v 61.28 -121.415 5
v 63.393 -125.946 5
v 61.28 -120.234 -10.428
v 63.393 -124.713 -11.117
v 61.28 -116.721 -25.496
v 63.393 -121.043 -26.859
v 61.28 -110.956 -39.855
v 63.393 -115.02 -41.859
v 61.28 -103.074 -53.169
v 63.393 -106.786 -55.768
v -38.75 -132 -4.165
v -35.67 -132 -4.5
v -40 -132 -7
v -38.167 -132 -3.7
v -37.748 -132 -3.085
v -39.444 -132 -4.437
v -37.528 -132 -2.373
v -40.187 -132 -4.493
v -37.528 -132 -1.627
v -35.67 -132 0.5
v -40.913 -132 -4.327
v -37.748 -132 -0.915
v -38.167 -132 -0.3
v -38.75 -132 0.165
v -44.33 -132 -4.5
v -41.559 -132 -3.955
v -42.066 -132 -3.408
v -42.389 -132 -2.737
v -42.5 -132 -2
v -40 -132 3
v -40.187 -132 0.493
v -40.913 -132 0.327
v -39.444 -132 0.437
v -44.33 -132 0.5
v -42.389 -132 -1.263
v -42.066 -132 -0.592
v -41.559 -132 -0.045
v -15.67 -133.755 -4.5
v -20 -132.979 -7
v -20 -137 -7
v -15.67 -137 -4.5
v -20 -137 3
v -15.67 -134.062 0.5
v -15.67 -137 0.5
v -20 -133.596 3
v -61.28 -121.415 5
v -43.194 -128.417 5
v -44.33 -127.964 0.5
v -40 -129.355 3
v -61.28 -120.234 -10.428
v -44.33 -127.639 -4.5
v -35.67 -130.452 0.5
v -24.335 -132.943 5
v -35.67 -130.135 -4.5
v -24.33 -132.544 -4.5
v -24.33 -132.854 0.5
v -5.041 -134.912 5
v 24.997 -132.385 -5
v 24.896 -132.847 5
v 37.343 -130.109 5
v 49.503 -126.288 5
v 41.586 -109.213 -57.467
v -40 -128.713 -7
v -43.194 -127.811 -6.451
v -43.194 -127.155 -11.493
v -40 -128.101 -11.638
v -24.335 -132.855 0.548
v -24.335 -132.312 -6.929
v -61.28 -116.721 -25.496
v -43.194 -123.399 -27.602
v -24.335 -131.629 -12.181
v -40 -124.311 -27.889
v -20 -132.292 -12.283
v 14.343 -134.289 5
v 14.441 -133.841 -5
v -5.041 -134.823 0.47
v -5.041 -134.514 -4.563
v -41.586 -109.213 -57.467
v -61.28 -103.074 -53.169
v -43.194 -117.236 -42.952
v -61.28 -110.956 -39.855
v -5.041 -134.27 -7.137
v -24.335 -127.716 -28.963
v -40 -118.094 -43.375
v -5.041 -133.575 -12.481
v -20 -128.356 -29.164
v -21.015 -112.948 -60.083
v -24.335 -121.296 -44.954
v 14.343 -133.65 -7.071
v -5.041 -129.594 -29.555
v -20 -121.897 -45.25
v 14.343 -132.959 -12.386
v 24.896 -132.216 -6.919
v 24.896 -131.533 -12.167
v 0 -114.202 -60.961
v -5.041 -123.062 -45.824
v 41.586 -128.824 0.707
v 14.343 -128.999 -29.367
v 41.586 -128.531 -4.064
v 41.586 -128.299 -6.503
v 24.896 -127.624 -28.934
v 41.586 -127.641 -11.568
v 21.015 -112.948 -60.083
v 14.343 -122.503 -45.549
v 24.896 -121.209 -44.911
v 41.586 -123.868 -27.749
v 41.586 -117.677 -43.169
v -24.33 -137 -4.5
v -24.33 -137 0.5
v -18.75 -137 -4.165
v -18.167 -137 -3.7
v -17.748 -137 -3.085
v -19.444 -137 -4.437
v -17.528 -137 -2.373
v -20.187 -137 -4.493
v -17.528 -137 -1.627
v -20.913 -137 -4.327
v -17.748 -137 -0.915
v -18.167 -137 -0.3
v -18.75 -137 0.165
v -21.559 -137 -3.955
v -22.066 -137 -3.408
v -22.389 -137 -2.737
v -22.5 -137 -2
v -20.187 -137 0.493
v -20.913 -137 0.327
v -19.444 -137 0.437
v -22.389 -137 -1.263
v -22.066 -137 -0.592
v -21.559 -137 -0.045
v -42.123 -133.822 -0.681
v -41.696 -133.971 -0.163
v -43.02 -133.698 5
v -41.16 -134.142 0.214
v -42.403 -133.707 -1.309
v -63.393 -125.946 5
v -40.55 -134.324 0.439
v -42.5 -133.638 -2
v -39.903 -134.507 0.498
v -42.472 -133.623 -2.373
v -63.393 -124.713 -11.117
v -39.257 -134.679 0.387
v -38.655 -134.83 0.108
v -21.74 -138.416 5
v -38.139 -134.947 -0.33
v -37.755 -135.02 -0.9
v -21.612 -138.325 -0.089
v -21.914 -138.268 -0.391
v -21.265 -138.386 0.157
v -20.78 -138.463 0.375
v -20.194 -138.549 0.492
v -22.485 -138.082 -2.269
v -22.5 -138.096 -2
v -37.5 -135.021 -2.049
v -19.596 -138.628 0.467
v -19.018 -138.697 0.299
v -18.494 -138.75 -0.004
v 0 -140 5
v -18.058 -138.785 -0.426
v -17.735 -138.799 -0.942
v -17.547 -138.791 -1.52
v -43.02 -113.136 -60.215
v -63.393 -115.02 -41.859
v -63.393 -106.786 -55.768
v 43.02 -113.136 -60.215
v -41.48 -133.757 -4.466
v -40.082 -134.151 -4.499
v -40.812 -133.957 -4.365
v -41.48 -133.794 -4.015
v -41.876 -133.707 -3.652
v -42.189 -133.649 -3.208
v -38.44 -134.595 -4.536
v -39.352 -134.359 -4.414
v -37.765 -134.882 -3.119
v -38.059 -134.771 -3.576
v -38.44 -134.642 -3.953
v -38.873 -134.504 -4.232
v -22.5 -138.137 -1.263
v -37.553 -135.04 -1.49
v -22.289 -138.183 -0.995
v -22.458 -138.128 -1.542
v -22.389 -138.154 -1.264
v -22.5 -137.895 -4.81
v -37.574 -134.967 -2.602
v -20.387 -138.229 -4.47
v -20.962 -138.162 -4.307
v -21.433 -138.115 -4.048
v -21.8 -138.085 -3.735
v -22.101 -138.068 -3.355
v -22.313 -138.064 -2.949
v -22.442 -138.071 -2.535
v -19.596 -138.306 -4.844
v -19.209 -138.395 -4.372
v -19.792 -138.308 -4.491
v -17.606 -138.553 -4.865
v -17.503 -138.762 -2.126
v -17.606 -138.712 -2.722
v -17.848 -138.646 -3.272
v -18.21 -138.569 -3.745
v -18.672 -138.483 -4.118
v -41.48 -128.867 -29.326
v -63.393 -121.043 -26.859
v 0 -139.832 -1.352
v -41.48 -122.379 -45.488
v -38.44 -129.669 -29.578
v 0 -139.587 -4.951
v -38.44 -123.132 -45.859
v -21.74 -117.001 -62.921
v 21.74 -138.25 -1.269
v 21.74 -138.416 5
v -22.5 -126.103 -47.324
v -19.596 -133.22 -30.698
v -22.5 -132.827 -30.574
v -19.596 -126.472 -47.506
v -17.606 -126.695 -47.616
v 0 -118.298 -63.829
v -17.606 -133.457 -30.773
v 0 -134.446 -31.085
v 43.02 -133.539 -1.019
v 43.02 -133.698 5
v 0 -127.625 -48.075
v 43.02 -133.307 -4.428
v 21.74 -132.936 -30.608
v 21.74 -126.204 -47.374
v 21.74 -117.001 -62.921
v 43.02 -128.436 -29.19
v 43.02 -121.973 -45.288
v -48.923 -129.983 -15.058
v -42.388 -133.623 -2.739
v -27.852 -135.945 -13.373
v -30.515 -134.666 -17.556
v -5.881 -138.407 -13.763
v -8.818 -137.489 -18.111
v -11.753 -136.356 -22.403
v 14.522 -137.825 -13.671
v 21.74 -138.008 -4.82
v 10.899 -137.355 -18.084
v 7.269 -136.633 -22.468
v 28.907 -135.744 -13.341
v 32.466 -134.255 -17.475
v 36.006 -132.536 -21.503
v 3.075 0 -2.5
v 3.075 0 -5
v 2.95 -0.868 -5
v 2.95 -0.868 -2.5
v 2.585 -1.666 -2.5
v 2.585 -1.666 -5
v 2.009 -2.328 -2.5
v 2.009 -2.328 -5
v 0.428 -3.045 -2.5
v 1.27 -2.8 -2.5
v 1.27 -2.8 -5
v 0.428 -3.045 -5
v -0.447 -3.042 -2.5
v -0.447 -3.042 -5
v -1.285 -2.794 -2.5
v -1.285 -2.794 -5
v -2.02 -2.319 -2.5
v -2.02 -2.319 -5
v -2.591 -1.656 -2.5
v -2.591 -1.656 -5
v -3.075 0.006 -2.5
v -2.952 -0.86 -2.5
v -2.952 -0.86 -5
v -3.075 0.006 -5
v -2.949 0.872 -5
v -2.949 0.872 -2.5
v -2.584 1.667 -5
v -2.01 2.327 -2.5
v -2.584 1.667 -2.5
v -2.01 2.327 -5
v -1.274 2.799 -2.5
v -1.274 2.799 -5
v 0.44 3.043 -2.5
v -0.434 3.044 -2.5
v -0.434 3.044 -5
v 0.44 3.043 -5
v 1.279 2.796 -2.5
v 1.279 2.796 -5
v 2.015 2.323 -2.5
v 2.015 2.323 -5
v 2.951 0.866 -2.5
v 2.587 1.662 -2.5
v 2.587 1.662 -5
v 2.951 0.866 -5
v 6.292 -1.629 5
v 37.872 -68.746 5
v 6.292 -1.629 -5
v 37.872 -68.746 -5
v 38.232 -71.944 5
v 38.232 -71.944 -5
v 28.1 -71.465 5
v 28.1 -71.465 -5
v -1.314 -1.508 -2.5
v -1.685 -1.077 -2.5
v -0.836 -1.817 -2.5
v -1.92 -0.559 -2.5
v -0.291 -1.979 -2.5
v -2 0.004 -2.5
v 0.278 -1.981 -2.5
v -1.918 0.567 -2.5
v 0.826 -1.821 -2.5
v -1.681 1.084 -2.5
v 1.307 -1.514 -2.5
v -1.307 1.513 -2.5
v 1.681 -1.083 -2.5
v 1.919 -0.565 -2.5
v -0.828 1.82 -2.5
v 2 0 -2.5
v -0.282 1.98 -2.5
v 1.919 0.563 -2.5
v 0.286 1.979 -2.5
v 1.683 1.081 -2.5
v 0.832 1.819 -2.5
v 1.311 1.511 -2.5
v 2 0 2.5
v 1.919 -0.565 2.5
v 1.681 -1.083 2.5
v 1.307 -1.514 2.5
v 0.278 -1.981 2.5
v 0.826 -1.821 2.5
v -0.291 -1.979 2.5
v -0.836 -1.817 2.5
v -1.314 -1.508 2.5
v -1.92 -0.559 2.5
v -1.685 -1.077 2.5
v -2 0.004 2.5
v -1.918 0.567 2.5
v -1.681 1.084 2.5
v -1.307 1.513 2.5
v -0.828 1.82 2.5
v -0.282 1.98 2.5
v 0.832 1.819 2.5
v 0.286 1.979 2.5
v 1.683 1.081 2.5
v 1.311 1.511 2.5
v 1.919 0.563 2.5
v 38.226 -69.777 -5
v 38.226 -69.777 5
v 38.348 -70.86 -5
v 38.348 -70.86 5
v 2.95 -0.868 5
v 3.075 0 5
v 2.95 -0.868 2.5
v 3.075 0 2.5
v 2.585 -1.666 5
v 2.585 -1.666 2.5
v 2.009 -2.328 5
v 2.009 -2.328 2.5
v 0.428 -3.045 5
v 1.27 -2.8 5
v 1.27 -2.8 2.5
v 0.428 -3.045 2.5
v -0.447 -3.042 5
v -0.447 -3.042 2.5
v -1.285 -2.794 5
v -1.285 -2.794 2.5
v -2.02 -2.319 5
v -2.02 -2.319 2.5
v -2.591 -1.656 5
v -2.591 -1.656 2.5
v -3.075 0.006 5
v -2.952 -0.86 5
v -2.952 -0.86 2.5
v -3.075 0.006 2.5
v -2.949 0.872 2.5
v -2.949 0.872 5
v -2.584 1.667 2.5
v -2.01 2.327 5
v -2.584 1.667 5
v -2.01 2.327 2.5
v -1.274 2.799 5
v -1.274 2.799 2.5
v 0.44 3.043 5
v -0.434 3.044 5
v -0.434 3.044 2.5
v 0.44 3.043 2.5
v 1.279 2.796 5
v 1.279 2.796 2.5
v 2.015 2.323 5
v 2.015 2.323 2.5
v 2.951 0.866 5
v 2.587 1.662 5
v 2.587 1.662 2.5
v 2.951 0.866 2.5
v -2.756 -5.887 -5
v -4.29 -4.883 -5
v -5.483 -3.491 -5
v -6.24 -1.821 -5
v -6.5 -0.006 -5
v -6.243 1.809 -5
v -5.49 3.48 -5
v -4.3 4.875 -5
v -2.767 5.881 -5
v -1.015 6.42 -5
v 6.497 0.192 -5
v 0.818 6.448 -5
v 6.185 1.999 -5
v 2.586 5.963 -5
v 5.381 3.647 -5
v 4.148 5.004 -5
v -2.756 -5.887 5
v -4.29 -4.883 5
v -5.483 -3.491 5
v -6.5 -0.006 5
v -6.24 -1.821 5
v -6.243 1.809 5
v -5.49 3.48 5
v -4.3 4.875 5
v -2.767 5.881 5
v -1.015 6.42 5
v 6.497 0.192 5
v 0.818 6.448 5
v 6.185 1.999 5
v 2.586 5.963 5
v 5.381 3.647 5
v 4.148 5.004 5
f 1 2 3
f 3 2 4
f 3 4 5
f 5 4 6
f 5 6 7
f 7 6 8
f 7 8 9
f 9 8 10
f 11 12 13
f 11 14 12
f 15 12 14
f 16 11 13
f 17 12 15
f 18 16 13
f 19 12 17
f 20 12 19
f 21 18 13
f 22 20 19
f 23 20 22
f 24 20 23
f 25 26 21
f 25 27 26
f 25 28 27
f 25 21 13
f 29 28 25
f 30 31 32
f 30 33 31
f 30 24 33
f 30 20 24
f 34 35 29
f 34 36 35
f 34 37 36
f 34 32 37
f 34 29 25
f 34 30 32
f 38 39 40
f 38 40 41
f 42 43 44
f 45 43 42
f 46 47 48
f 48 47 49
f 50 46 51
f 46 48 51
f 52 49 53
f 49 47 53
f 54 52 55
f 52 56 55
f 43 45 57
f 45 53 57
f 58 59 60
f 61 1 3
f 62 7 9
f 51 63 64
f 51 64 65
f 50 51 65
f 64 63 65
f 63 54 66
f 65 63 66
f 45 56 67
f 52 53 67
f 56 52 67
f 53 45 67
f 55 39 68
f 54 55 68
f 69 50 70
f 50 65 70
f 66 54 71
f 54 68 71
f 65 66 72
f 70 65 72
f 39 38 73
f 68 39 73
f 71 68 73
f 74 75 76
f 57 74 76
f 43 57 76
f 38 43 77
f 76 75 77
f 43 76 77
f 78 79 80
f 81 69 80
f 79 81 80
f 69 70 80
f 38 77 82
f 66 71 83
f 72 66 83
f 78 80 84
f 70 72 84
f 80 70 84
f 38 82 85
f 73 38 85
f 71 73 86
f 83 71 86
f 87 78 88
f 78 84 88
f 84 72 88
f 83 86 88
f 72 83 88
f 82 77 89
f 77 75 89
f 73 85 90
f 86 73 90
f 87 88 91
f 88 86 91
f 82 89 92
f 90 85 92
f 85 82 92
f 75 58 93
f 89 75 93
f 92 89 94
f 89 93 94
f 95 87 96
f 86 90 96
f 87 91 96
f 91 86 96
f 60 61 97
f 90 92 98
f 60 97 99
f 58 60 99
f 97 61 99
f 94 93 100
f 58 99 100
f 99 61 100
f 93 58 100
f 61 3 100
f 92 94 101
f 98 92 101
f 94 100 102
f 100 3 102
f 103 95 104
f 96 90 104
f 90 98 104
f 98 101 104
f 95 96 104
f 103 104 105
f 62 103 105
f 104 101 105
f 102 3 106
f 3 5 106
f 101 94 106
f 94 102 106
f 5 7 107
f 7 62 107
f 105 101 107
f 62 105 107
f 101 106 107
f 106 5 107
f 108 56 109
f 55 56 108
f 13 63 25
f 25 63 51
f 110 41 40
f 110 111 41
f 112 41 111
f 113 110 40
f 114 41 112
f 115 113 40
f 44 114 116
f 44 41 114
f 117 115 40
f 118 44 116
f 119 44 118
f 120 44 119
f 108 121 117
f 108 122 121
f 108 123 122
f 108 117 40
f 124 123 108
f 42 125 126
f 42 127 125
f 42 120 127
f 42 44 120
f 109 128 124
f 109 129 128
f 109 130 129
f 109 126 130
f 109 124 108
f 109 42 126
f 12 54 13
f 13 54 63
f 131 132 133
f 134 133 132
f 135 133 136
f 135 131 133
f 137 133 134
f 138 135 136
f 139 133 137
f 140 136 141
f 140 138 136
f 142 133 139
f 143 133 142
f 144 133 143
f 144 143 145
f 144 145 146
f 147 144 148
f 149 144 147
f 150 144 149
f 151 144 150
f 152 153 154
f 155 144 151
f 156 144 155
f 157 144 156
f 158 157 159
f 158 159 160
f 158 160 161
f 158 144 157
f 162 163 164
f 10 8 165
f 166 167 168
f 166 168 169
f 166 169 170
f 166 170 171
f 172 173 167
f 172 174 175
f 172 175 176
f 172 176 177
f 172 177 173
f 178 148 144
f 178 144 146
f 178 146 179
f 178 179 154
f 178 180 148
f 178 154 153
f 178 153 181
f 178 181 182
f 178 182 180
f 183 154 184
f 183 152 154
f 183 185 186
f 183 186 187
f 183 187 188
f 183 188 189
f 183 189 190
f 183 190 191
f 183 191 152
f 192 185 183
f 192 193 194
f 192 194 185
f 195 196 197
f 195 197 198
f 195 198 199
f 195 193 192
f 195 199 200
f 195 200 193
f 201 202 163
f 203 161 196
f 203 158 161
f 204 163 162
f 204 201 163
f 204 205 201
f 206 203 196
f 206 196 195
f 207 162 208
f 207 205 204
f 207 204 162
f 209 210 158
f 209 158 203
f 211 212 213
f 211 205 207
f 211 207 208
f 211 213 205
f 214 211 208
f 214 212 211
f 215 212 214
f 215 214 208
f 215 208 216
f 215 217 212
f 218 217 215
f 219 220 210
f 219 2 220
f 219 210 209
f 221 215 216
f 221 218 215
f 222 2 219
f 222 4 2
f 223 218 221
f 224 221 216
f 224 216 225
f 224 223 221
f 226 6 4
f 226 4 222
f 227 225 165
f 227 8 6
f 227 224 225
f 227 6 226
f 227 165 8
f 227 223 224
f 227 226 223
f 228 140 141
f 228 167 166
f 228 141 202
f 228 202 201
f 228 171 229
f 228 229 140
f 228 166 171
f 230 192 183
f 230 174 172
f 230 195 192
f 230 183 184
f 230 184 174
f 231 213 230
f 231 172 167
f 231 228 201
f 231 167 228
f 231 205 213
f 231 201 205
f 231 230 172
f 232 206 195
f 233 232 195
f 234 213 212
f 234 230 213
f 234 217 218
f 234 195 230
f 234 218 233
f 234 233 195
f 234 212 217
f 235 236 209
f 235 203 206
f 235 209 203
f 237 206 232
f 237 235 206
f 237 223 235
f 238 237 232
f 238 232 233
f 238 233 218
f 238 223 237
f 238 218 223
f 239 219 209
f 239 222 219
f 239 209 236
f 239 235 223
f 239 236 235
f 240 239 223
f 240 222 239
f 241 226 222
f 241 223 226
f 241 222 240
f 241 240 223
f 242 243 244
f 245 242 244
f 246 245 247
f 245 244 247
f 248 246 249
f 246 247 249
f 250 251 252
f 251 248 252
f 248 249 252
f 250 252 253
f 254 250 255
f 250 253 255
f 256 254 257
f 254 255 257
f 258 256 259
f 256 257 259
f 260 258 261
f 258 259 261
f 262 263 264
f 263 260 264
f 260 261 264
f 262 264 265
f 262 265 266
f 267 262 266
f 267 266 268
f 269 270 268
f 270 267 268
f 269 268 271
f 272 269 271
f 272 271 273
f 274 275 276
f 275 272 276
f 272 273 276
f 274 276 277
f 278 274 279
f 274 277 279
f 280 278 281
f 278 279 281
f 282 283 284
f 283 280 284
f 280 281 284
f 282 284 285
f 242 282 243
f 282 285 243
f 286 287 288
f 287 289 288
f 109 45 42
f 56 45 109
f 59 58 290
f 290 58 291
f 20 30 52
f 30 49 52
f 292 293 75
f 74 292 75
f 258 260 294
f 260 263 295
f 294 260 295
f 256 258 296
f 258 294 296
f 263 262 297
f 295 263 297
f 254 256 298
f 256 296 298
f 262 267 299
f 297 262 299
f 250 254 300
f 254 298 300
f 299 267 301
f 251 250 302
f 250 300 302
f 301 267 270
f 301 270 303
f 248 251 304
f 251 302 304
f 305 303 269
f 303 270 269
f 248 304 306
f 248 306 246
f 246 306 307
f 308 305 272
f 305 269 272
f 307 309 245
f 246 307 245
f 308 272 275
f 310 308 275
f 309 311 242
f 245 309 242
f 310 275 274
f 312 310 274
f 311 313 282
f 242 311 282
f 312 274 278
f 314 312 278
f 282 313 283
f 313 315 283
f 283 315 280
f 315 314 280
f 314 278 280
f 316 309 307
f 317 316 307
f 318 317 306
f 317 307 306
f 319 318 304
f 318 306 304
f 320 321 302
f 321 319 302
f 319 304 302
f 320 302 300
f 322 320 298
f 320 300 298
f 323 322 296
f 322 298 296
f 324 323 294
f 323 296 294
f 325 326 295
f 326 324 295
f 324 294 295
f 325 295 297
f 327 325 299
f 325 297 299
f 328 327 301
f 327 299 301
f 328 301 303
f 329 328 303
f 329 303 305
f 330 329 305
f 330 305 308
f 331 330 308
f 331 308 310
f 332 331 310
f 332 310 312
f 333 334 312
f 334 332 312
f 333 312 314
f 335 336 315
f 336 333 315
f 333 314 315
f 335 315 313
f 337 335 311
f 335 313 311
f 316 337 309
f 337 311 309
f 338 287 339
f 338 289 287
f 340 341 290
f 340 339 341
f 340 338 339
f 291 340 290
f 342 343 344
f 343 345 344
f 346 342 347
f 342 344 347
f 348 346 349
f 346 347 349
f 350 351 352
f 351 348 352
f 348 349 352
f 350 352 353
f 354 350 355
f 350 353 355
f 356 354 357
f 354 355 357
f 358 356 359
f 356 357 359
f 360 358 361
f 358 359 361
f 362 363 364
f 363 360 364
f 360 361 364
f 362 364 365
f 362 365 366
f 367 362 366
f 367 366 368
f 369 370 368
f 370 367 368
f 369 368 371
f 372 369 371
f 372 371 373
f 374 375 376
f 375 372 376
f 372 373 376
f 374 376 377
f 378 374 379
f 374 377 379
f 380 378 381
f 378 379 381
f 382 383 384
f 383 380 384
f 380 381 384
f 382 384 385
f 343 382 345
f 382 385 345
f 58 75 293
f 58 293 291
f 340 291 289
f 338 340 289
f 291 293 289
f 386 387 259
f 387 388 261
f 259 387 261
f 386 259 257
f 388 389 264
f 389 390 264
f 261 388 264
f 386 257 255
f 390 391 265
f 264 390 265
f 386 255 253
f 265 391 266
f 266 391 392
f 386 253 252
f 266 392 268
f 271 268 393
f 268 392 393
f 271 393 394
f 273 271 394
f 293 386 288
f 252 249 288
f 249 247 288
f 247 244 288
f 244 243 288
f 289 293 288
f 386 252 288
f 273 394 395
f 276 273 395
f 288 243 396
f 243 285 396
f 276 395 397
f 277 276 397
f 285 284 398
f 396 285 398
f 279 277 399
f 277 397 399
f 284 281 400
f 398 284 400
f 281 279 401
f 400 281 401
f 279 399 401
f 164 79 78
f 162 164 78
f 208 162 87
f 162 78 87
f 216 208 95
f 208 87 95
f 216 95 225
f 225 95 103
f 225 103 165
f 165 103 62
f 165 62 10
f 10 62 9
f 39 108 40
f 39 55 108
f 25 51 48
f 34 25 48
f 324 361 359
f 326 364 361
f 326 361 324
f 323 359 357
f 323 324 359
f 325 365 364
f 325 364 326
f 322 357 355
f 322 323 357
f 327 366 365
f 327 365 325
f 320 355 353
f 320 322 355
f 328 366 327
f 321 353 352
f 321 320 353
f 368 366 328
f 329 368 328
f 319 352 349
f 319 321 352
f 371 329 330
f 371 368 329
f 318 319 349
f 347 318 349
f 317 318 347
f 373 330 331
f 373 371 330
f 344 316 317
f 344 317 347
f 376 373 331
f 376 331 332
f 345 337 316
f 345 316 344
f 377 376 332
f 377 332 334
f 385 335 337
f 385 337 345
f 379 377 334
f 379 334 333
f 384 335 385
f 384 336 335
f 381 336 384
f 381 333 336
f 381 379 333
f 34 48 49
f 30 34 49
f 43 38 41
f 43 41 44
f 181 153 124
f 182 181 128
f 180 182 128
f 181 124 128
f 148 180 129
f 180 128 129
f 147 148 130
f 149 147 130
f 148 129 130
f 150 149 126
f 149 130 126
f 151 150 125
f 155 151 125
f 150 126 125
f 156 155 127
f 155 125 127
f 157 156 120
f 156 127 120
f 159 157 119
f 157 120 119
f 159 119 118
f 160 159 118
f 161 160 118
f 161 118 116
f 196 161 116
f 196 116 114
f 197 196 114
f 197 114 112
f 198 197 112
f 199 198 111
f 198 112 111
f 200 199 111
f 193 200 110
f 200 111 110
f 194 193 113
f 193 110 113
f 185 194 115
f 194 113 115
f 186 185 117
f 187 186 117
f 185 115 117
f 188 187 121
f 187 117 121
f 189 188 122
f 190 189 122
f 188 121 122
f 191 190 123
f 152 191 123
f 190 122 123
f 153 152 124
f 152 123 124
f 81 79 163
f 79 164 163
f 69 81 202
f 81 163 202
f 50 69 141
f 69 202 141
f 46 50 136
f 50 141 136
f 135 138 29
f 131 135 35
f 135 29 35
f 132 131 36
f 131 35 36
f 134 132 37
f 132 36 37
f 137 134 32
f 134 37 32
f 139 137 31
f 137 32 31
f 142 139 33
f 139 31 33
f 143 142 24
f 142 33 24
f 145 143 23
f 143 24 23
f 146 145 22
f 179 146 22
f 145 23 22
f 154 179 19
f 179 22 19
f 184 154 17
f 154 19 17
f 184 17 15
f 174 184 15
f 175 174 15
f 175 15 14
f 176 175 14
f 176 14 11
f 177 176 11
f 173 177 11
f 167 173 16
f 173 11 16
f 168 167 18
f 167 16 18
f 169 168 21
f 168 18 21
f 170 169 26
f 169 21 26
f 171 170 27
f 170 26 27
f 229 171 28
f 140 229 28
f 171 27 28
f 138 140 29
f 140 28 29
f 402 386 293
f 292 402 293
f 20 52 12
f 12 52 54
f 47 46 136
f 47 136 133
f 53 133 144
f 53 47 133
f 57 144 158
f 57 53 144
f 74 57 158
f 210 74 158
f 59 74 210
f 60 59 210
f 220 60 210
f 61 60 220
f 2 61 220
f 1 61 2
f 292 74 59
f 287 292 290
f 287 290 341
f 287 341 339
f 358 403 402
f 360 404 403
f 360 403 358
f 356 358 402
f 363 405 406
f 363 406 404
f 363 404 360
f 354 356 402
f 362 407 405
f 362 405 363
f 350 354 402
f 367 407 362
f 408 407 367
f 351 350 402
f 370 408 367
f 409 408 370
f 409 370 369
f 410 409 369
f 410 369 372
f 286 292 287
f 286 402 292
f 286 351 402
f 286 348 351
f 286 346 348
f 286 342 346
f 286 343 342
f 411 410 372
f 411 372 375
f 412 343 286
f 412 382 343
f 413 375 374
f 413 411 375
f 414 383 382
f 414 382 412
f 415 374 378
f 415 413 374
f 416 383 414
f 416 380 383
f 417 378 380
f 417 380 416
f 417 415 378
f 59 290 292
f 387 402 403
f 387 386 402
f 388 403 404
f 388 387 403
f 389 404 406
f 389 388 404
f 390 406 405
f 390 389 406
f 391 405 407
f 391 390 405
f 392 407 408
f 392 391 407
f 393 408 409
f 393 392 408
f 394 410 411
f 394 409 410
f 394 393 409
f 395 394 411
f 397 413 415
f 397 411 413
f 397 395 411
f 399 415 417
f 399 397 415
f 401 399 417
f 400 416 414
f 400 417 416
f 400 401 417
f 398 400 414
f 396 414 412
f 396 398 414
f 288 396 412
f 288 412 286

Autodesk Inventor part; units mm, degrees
ref_plane "YZ Plane" through (0, 0, 0) normal (1, 0, 0) x (0, 1, 0)
ref_plane "XZ Plane" through (0, 0, 0) normal (0, 1, 0) x (-1, 0, 0)
ref_plane "XY Plane" through (0, 0, 0) normal (0, 0, 1) x (1, 0, 0)
sketch "スケッチ1" plane through (0, 0, 0) normal (0, 0, 1) x (1, 0, 0)
  arc A0 (-81.314, -122.2088) -> (79.2809, -122.2088) centre (-1.0165, 49.9897) ccw
  line L0 (-1.0165, 49.9897) -> (79.2809, -122.2088) construction
  line L1 (-1.0165, 49.9897) -> (188.9835, 49.9897) construction
  line L2 (-1.0165, 49.9897) -> (-81.314, -122.2088) construction
  arc A1 (-79.2009, -117.6773) -> (77.1678, -117.6773) centre (-1.0165, 49.9897) ccw
  line L3 (-1.0165, 49.9897) -> (77.1678, -117.6773) construction
  line L4 (-1.0165, 49.9897) -> (183.9835, 49.9897) construction
  line L5 (-1.0165, 49.9897) -> (-79.2009, -117.6773) construction
  line L6 (0, -135.0075) -> (35, -74.3858)
  line L7 (0, -135.0075) -> (70, -135.0075) construction
  line L8 (35, -74.3858) -> (2.1456, -4.5601)
  line L9 (35, -74.3858) -> (112.1689, -74.3858) construction
  circle A2 centre (0, 0) radius 2
  circle A3 centre (0, 0) radius 3.075
  circle A4 centre (0, 0) radius 6.5
  line L10 (0, 0) -> (33.3477, -70.8742) construction
  line L11 (-4.5242, -2.1287) -> (28.8235, -73.0029)
  line L12 (37.8719, -68.7455) -> (4.5242, 2.1287)
  arc A5 (4.5242, 2.1287) -> (-4.5242, -2.1287) centre (0, 0) ccw
  arc A6 (28.8235, -73.0029) -> (37.8719, -68.7455) centre (33.3477, -70.8742) ccw
  line L13 (-1.0165, -135.0103) -> (33.3477, -70.8742) construction
  line L14 (3.3907, -137.3717) -> (37.755, -73.2356)
  line L15 (28.9405, -68.5128) -> (-5.4238, -132.6489)
  arc A7 (-5.4238, -132.6489) -> (3.3907, -137.3717) centre (-1.0165, -135.0103) ccw
  arc A8 (37.755, -73.2356) -> (28.9405, -68.5128) centre (33.3477, -70.8742) ccw
  arc A9 (-80.0461, -119.4899) -> (78.0131, -119.4899) centre (-1.0165, 49.9897) ccw
  line L16 (-1.0165, 49.9897) -> (78.0131, -119.4899) construction
  line L17 (-1.0165, 49.9897) -> (185.9835, 49.9897) construction
  line L18 (-1.0165, 49.9897) -> (-80.0461, -119.4899) construction
  line L19 (0, 0) -> (19.103, -135.9248)
  line L20 (0, 0) -> (137.2607, 0) construction
  line L21 (33.3477, -70.8742) -> (19.103, -135.9248) construction
  line L22 (28.4635, -69.8046) -> (14.2187, -134.8553)
  line L23 (23.9873, -136.9944) -> (38.232, -71.9437)
  arc A10 (38.232, -71.9437) -> (28.4635, -69.8046) centre (33.3477, -70.8742) ccw
  arc A11 (14.2187, -134.8553) -> (23.9873, -136.9944) centre (19.103, -135.9248) ccw
  point P0 (0, 0)
  point P1 (16.6739, -35.4371)
  point P2 (16.1656, -102.9423)
  point P3 (6.2925, -1.6294)
  point P4 (-2.756, -5.8868)
  point P5 (27.7533, -70.7285)
  point P6 (37.8719, -68.7455)
  point P7 (-5.6235, -136.9536)
  point P8 (3.6151, -136.953)
  point P9 (37.755, -73.2356)
  point P10 (37.8719, -68.7455)
  point P11 (33.3512, -133.8251)
  point P12 (26.2254, -103.3995)
  point P13 (28.0999, -71.465)
  point P14 (14.1253, -136.3963)
  point P15 (24.3626, -135.2801)
  dimension "d0" = 50
  dimension "d1" = 190
  dimension "d2" = 65
  dimension "d3" = 50
  dimension "d4" = 185
  dimension "d5" = 65
  dimension "d6" = 50
  dimension "d7" = 70
  dimension "d8" = 60
  dimension "d9" = 0
  dimension "d11" = 4
  dimension "d12" = 6.15
  dimension "d13" = 13
  dimension "d14" = 10
  dimension "d15" = 10
  dimension "d16" = 187
  dimension "d17" = 65
  dimension "d18" = 50
  dimension "d34" = 0
  dimension "d35" = 0
  dimension "d36" = 82
  dimension "d37" = 10
extrude "押し出し1" add sketch "スケッチ1" along normal mid plane 5 contours A3
extrude "押し出し2" add sketch "スケッチ1" along normal mid plane 10 contours L11 L19 A4 L8 A8 L15 | L11 A4 L19 | L11 A5 L12 A4 | A4 L12 A5 L11 | A8 L8 A4 L12
extrude "押し出し3" add sketch "スケッチ1" along normal mid plane 10 contours A11 L22 A1 L19 A9 | L19 A1 L23 A9 | L19 L22 L14 A6 L23 A1 | A1 L22 L19 | L22 L11 A6 L6 | L6 A6 L14 L22 | L15 A10 L22 L11 | A6 L6 L8 A8 | A6 L11 L22 A10 A8 L8 L6
sketch "スケッチ2" plane through (0, 0, 5) normal (0, 0, 1) x (1, 0, 0)
  line L0 (-17.1369, -20) -> (12.9571, -20)
  arc A0 (-63.3927, -125.9462) -> (63.3927, -125.9462) centre (0, 10) ccw
  line L1 (0, 10) -> (63.3927, -125.9462) construction
  line L2 (0, 10) -> (150, 10) construction
  line L3 (0, 10) -> (-63.3927, -125.9462) construction
  arc A1 (-61.2796, -121.4146) -> (61.2796, -121.4146) centre (0, 10) ccw
  line L4 (0, 10) -> (61.2796, -121.4146) construction
  line L5 (0, 10) -> (145, 10) construction
  line L6 (0, 10) -> (-61.2796, -121.4146) construction
  line L7 (-63.3927, -125.9462) -> (-61.2796, -121.4146)
  line L8 (63.3927, -125.9462) -> (61.2796, -121.4146)
  point P0 (0, 0)
  point P1 (0, -20)
  dimension "d25" = 20
  dimension "d26" = 10
  dimension "d27" = 150
  dimension "d28" = 65
  dimension "d29" = 50
  dimension "d30" = 145
  dimension "d31" = 65
  dimension "d32" = 50
revolve "回転1" add sketch "スケッチ2" angle 35 about axis through (-17.1369, -20, 5) along (1, 0, 0)
sketch "スケッチ3" plane through (0, 0, 0) normal (0, 1, 0) x (-1, 0, 0)
  line L0 (-14.3428, 5) -> (61.2796, 5) projected
  circle A0 centre (20, -2) radius 2.5
  line L1 (20, 3) -> (24.3301, 0.5)
  line L2 (24.3301, 0.5) -> (24.3301, -4.5)
  line L3 (24.3301, -4.5) -> (20, -7)
  line L4 (20, -7) -> (15.6699, -4.5)
  line L5 (15.6699, -4.5) -> (15.6699, 0.5)
  line L6 (15.6699, 0.5) -> (20, 3)
  circle A1 centre (40, -2) radius 2.5
  line L7 (40, 3) -> (35.6699, 0.5)
  line L8 (35.6699, 0.5) -> (35.6699, -4.5)
  line L9 (35.6699, -4.5) -> (40, -7)
  line L10 (40, -7) -> (44.3301, -4.5)
  line L11 (44.3301, -4.5) -> (44.3301, 0.5)
  line L12 (44.3301, 0.5) -> (40, 3)
  point P0 (0, 0)
  dimension "d38" = 7
  dimension "d39" = 20
  dimension "d40" = 5
  dimension "d41" = 10
extrude "押し出し4" cut sketch "スケッチ3" against normal blind 1000 contours A0 | A1
extrude "押し出し5" cut sketch "スケッチ3" against normal blind 132 contours L12 L11 L10 L9 L8 L7
extrude "押し出し6" cut sketch "スケッチ3" against normal blind 137 contours L1 L2 L3 L4 L5 L6
properties part number "passive_walking_robot5"
